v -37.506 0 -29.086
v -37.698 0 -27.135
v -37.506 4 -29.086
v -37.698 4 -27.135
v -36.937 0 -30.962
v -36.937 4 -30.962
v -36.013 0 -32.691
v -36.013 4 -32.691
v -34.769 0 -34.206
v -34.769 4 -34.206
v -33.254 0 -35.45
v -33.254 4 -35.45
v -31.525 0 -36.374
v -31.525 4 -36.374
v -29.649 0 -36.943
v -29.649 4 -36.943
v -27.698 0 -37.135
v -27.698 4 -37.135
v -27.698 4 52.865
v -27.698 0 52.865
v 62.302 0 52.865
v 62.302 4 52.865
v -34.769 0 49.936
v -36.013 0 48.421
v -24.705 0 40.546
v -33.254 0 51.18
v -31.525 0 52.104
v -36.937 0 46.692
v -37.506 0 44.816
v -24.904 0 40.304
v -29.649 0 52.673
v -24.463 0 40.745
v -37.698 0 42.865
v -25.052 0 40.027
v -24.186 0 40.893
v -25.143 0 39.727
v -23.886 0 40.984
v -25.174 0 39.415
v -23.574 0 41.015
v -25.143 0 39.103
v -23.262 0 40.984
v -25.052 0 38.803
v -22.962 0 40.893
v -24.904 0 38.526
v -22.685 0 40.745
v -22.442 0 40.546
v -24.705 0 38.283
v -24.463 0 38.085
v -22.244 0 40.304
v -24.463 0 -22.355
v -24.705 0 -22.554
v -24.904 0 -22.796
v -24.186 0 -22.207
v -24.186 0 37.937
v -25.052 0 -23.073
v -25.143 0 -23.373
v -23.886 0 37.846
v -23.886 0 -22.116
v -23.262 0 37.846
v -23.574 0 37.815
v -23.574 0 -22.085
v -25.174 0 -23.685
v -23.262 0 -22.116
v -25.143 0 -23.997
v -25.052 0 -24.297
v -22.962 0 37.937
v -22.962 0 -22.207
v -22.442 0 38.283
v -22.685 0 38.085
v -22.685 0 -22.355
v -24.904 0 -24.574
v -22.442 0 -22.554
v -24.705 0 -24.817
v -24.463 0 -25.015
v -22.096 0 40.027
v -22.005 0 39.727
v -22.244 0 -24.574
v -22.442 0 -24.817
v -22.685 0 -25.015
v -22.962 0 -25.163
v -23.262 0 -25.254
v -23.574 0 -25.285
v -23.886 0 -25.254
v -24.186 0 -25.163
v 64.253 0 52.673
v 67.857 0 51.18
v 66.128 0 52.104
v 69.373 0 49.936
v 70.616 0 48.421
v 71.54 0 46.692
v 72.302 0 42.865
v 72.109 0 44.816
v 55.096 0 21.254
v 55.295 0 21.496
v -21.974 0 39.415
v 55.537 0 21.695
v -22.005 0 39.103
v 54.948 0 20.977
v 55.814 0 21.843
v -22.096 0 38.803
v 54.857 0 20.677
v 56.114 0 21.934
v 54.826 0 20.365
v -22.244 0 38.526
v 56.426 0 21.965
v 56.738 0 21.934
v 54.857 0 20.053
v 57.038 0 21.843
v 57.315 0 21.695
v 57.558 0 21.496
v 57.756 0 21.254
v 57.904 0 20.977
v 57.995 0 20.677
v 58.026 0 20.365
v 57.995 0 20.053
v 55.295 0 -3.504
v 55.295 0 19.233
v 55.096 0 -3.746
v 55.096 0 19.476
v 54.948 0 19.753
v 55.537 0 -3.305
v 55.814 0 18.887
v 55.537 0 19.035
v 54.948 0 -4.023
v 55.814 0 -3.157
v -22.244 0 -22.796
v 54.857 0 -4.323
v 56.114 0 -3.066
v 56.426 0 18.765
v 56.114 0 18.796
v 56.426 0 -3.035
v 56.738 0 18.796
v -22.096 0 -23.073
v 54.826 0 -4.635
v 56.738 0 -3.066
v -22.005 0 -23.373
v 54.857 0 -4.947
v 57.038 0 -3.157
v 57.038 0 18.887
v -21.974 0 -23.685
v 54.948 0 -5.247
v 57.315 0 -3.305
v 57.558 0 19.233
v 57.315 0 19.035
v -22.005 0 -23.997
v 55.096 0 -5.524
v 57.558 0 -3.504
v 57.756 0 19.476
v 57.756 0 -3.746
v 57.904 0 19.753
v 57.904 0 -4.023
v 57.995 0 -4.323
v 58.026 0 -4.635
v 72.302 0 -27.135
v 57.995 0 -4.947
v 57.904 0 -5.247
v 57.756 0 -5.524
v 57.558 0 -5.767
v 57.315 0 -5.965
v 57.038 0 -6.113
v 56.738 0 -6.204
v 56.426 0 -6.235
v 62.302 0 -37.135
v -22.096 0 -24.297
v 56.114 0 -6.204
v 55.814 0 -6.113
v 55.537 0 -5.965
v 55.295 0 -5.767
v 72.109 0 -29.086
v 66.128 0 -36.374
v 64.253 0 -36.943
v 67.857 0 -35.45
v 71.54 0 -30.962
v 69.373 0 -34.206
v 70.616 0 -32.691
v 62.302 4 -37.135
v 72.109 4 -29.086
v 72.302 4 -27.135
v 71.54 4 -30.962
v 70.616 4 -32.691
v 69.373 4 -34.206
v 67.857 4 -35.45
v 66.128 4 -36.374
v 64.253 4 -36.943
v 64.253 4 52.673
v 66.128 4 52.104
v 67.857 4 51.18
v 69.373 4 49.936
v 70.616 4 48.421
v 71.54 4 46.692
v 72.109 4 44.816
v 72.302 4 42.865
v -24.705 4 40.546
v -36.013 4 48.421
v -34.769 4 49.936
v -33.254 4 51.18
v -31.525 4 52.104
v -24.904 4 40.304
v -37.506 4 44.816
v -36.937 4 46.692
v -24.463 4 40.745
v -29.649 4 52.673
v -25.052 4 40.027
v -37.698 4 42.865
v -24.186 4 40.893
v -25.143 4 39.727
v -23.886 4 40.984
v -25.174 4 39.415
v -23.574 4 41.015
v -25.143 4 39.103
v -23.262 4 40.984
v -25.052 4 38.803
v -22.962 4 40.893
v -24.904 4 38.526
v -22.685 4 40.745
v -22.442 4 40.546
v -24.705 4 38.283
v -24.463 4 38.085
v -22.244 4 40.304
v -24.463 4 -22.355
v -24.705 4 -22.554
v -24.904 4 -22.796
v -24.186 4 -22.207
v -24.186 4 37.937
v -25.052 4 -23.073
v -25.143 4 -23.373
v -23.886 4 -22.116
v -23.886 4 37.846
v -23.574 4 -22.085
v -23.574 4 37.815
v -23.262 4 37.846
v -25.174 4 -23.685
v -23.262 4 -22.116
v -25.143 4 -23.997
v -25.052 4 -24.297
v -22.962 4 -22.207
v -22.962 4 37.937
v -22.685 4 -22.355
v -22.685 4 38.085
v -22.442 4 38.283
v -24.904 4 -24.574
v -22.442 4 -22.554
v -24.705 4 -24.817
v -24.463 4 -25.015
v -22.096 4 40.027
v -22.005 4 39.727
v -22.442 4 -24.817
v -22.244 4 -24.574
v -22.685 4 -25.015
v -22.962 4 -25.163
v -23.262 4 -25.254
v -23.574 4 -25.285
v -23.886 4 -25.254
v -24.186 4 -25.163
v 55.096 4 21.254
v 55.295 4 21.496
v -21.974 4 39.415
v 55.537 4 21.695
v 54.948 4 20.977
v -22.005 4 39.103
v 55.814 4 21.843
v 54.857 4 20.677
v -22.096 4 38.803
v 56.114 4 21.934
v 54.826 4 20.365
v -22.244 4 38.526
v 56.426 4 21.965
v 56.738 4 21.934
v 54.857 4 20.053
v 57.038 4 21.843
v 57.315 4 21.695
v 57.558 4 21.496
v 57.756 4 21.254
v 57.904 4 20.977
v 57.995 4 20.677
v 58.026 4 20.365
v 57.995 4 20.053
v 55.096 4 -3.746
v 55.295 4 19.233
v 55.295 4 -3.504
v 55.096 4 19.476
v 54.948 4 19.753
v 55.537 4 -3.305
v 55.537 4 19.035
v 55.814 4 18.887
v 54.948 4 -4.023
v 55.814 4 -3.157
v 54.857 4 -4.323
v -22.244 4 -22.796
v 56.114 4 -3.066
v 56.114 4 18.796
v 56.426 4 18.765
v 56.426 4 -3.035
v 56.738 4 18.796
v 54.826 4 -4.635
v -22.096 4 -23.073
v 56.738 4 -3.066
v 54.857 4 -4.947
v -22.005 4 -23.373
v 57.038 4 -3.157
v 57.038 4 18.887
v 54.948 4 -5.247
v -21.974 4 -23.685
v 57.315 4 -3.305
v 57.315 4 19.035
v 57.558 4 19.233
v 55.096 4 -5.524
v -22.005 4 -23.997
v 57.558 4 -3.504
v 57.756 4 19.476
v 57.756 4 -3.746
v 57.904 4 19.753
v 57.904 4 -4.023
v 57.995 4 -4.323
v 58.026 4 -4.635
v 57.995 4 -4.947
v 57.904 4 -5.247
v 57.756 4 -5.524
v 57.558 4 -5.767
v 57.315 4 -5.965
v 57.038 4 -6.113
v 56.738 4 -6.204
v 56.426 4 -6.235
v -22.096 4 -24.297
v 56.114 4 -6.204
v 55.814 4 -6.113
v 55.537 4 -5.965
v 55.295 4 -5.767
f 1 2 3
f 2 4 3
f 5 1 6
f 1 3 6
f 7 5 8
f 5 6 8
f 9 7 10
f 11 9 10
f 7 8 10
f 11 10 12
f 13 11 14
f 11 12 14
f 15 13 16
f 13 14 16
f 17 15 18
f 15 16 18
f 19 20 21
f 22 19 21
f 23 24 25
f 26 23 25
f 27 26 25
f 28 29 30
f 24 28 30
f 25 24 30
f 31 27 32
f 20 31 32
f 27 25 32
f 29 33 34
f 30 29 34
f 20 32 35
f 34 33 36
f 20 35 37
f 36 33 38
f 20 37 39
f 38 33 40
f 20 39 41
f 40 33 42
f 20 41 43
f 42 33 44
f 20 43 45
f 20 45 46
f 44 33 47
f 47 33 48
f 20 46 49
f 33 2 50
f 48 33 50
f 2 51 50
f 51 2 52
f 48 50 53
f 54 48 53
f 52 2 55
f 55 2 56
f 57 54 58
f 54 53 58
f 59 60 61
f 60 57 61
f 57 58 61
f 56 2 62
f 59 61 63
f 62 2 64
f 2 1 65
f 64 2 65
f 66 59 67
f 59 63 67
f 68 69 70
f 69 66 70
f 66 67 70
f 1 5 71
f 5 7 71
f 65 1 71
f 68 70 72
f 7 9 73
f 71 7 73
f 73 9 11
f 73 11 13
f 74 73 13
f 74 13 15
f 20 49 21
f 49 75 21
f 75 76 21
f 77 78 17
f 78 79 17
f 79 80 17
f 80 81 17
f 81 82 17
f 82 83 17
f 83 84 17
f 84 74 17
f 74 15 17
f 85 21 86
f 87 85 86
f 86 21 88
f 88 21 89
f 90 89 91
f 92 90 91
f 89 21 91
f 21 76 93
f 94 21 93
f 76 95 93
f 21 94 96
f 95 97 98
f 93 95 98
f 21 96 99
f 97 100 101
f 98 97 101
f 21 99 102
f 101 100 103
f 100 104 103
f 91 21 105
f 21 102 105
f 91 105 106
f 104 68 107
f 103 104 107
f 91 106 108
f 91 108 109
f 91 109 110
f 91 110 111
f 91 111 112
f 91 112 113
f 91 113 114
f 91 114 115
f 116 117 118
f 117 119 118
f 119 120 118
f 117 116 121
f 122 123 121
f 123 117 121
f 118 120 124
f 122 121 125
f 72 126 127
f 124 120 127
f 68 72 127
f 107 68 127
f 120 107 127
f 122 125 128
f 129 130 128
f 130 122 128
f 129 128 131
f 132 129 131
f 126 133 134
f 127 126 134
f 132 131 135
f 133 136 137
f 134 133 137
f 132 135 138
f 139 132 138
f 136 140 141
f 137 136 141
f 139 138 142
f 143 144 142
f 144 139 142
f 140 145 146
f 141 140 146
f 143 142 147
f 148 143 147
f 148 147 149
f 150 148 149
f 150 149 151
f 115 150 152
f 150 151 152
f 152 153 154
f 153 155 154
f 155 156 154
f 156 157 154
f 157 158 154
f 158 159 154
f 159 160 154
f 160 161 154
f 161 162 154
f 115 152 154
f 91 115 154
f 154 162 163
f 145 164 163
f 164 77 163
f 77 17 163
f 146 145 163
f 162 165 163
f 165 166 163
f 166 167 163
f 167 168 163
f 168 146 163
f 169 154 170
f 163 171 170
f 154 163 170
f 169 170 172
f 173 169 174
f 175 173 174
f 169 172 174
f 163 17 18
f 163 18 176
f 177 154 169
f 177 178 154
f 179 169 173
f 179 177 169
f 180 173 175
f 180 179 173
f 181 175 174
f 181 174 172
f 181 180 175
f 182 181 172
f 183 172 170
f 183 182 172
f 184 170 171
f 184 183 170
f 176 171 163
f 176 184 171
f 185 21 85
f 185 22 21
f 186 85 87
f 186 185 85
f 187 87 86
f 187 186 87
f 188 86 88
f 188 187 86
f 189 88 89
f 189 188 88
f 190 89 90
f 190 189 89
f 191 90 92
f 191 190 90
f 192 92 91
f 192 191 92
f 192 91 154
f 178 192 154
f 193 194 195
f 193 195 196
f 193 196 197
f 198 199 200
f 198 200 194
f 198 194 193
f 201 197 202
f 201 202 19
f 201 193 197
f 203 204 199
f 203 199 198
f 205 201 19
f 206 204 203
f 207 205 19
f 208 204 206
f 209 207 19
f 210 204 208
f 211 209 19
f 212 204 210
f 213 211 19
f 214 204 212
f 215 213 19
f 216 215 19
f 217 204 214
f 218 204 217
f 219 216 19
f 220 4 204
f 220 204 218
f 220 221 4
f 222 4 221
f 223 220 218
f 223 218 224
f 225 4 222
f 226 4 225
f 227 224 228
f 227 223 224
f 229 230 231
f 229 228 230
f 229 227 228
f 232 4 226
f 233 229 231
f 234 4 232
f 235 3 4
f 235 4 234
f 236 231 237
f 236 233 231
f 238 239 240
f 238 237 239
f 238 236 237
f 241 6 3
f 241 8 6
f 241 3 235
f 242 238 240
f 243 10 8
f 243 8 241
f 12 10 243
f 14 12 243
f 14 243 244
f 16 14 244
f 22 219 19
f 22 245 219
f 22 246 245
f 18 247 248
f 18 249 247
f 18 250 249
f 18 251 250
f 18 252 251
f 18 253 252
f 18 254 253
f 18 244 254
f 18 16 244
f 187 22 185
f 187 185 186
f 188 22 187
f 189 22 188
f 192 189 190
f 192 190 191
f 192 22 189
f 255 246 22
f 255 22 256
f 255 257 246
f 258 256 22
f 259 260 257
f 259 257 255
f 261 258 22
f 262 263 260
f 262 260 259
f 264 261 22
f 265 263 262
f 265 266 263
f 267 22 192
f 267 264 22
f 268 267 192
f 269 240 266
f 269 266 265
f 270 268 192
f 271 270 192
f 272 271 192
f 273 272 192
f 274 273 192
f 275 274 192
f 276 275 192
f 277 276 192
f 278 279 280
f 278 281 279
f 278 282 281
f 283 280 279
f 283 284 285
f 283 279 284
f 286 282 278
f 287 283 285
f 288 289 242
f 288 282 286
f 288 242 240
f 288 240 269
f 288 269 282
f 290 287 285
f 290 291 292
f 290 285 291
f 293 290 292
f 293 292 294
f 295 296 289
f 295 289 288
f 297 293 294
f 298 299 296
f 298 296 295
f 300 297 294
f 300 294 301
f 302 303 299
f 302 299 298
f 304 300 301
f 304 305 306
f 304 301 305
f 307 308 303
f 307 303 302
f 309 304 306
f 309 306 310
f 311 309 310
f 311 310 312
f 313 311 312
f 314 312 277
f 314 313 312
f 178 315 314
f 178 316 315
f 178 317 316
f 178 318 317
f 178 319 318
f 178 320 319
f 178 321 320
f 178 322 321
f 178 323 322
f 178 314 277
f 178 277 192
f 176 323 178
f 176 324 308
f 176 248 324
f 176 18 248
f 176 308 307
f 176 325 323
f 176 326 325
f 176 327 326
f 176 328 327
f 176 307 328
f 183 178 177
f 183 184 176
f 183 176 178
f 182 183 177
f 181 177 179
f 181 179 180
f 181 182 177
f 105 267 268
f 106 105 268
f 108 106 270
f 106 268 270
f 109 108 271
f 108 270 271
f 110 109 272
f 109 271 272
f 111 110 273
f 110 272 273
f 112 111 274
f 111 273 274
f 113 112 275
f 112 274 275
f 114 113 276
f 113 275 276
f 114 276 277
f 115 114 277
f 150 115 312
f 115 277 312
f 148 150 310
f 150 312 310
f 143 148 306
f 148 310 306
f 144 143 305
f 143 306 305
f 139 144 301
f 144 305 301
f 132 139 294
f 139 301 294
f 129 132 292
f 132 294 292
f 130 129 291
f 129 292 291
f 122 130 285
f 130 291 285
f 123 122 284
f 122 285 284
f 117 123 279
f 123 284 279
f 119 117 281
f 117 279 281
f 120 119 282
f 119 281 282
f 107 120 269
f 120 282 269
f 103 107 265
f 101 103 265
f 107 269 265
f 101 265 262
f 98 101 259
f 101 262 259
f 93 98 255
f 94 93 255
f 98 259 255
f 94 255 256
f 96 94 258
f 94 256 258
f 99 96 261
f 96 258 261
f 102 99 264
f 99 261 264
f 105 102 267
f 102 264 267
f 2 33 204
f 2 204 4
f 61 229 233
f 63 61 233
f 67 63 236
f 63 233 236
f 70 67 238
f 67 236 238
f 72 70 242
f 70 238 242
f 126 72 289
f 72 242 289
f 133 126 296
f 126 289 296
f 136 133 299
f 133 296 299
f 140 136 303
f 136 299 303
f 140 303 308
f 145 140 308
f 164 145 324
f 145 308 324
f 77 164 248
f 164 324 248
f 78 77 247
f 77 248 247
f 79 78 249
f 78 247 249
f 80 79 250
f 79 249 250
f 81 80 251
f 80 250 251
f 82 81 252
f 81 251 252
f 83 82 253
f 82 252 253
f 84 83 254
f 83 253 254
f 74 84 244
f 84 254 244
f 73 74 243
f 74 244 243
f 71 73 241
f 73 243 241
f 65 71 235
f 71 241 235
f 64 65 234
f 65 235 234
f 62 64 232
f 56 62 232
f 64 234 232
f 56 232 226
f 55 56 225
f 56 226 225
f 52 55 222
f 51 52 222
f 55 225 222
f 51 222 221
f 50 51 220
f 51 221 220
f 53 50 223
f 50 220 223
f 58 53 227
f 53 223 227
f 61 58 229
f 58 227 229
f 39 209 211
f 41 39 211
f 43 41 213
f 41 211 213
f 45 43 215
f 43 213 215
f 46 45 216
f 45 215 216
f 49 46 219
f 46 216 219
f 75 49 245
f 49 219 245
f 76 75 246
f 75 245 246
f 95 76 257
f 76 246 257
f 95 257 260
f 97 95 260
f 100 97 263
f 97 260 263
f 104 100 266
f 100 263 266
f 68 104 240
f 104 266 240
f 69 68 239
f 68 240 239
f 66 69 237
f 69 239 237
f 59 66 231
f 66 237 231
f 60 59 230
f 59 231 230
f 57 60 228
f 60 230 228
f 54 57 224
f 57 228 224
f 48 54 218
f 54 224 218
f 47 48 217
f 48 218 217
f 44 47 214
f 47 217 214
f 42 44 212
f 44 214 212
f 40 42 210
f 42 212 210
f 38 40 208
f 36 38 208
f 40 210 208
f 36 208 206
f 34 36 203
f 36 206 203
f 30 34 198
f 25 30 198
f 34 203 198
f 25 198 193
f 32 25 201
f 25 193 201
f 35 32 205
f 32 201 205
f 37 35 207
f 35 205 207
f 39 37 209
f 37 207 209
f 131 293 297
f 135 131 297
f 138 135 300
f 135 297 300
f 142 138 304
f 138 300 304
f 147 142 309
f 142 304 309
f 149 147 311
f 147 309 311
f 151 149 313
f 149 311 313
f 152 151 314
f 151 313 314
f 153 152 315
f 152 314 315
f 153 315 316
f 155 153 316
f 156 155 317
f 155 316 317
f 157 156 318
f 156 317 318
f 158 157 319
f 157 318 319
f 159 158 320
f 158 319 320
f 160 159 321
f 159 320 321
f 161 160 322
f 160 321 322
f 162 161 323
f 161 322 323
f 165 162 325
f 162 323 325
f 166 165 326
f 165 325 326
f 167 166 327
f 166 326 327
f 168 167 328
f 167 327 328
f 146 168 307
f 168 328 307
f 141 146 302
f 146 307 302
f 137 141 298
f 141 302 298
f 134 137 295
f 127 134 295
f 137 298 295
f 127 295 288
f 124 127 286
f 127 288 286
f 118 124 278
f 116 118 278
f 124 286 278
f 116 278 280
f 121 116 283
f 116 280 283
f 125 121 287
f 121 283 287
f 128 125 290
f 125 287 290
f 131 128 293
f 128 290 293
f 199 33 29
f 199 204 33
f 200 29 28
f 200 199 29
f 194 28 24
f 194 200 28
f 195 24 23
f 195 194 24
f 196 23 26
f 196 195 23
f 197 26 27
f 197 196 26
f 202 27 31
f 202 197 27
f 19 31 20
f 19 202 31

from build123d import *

# Parameters (mm, degrees)
SKETCH_1_W          = 110
SKETCH_1_H          = 90
EXTRUDE_1_DEPTH     = 4
FILLET_1_R          = 10
SKETCH_2_R          = 1.6
CUT_EXTRUDE_1_DEPTH = 4


with BuildPart() as part:
    # 草图1 → 凸台-拉伸1 (new body)
    with BuildSketch(Plane(origin=(0, 0, 0), x_dir=(1, 0, 0), z_dir=(0, 1, 0))):
        with Locations((17.30161478, -7.864857462)):
            Rectangle(SKETCH_1_W, SKETCH_1_H)
    extrude(amount=EXTRUDE_1_DEPTH)

    # 圆角1
    fillet_1_edges = [part.edges().sort_by_distance(p)[0] for p in [
        (-37.69838522, 2, -37.135142538),
        (72.30161478, 2, -37.135142538),
        (72.30161478, 2, 52.864857462),
        (-37.69838522, 2, 52.864857462),
    ]]
    fillet(fillet_1_edges, radius=FILLET_1_R)

    # 草图2 → 切除-拉伸1 (cut)
    with BuildSketch(Plane(origin=(0, 4, 0), x_dir=(1, 0, 0), z_dir=(0, 1, 0))):
        with Locations(Location((-23.573851483, 23.685142538, 0), (0, 0, 270))):
            Circle(SKETCH_2_R)
        with Locations(Location((-23.573851483, -39.414857462, 0), (0, 0, 270))):
            Circle(SKETCH_2_R)
        with Locations(Location((56.426148517, -20.364857462, 0), (0, 0, 270))):
            Circle(SKETCH_2_R)
        with Locations(Location((56.426148517, 4.635142538, 0), (0, 0, 270))):
            Circle(SKETCH_2_R)
    extrude(amount=-CUT_EXTRUDE_1_DEPTH, mode=Mode.SUBTRACT)


solid = part.part
